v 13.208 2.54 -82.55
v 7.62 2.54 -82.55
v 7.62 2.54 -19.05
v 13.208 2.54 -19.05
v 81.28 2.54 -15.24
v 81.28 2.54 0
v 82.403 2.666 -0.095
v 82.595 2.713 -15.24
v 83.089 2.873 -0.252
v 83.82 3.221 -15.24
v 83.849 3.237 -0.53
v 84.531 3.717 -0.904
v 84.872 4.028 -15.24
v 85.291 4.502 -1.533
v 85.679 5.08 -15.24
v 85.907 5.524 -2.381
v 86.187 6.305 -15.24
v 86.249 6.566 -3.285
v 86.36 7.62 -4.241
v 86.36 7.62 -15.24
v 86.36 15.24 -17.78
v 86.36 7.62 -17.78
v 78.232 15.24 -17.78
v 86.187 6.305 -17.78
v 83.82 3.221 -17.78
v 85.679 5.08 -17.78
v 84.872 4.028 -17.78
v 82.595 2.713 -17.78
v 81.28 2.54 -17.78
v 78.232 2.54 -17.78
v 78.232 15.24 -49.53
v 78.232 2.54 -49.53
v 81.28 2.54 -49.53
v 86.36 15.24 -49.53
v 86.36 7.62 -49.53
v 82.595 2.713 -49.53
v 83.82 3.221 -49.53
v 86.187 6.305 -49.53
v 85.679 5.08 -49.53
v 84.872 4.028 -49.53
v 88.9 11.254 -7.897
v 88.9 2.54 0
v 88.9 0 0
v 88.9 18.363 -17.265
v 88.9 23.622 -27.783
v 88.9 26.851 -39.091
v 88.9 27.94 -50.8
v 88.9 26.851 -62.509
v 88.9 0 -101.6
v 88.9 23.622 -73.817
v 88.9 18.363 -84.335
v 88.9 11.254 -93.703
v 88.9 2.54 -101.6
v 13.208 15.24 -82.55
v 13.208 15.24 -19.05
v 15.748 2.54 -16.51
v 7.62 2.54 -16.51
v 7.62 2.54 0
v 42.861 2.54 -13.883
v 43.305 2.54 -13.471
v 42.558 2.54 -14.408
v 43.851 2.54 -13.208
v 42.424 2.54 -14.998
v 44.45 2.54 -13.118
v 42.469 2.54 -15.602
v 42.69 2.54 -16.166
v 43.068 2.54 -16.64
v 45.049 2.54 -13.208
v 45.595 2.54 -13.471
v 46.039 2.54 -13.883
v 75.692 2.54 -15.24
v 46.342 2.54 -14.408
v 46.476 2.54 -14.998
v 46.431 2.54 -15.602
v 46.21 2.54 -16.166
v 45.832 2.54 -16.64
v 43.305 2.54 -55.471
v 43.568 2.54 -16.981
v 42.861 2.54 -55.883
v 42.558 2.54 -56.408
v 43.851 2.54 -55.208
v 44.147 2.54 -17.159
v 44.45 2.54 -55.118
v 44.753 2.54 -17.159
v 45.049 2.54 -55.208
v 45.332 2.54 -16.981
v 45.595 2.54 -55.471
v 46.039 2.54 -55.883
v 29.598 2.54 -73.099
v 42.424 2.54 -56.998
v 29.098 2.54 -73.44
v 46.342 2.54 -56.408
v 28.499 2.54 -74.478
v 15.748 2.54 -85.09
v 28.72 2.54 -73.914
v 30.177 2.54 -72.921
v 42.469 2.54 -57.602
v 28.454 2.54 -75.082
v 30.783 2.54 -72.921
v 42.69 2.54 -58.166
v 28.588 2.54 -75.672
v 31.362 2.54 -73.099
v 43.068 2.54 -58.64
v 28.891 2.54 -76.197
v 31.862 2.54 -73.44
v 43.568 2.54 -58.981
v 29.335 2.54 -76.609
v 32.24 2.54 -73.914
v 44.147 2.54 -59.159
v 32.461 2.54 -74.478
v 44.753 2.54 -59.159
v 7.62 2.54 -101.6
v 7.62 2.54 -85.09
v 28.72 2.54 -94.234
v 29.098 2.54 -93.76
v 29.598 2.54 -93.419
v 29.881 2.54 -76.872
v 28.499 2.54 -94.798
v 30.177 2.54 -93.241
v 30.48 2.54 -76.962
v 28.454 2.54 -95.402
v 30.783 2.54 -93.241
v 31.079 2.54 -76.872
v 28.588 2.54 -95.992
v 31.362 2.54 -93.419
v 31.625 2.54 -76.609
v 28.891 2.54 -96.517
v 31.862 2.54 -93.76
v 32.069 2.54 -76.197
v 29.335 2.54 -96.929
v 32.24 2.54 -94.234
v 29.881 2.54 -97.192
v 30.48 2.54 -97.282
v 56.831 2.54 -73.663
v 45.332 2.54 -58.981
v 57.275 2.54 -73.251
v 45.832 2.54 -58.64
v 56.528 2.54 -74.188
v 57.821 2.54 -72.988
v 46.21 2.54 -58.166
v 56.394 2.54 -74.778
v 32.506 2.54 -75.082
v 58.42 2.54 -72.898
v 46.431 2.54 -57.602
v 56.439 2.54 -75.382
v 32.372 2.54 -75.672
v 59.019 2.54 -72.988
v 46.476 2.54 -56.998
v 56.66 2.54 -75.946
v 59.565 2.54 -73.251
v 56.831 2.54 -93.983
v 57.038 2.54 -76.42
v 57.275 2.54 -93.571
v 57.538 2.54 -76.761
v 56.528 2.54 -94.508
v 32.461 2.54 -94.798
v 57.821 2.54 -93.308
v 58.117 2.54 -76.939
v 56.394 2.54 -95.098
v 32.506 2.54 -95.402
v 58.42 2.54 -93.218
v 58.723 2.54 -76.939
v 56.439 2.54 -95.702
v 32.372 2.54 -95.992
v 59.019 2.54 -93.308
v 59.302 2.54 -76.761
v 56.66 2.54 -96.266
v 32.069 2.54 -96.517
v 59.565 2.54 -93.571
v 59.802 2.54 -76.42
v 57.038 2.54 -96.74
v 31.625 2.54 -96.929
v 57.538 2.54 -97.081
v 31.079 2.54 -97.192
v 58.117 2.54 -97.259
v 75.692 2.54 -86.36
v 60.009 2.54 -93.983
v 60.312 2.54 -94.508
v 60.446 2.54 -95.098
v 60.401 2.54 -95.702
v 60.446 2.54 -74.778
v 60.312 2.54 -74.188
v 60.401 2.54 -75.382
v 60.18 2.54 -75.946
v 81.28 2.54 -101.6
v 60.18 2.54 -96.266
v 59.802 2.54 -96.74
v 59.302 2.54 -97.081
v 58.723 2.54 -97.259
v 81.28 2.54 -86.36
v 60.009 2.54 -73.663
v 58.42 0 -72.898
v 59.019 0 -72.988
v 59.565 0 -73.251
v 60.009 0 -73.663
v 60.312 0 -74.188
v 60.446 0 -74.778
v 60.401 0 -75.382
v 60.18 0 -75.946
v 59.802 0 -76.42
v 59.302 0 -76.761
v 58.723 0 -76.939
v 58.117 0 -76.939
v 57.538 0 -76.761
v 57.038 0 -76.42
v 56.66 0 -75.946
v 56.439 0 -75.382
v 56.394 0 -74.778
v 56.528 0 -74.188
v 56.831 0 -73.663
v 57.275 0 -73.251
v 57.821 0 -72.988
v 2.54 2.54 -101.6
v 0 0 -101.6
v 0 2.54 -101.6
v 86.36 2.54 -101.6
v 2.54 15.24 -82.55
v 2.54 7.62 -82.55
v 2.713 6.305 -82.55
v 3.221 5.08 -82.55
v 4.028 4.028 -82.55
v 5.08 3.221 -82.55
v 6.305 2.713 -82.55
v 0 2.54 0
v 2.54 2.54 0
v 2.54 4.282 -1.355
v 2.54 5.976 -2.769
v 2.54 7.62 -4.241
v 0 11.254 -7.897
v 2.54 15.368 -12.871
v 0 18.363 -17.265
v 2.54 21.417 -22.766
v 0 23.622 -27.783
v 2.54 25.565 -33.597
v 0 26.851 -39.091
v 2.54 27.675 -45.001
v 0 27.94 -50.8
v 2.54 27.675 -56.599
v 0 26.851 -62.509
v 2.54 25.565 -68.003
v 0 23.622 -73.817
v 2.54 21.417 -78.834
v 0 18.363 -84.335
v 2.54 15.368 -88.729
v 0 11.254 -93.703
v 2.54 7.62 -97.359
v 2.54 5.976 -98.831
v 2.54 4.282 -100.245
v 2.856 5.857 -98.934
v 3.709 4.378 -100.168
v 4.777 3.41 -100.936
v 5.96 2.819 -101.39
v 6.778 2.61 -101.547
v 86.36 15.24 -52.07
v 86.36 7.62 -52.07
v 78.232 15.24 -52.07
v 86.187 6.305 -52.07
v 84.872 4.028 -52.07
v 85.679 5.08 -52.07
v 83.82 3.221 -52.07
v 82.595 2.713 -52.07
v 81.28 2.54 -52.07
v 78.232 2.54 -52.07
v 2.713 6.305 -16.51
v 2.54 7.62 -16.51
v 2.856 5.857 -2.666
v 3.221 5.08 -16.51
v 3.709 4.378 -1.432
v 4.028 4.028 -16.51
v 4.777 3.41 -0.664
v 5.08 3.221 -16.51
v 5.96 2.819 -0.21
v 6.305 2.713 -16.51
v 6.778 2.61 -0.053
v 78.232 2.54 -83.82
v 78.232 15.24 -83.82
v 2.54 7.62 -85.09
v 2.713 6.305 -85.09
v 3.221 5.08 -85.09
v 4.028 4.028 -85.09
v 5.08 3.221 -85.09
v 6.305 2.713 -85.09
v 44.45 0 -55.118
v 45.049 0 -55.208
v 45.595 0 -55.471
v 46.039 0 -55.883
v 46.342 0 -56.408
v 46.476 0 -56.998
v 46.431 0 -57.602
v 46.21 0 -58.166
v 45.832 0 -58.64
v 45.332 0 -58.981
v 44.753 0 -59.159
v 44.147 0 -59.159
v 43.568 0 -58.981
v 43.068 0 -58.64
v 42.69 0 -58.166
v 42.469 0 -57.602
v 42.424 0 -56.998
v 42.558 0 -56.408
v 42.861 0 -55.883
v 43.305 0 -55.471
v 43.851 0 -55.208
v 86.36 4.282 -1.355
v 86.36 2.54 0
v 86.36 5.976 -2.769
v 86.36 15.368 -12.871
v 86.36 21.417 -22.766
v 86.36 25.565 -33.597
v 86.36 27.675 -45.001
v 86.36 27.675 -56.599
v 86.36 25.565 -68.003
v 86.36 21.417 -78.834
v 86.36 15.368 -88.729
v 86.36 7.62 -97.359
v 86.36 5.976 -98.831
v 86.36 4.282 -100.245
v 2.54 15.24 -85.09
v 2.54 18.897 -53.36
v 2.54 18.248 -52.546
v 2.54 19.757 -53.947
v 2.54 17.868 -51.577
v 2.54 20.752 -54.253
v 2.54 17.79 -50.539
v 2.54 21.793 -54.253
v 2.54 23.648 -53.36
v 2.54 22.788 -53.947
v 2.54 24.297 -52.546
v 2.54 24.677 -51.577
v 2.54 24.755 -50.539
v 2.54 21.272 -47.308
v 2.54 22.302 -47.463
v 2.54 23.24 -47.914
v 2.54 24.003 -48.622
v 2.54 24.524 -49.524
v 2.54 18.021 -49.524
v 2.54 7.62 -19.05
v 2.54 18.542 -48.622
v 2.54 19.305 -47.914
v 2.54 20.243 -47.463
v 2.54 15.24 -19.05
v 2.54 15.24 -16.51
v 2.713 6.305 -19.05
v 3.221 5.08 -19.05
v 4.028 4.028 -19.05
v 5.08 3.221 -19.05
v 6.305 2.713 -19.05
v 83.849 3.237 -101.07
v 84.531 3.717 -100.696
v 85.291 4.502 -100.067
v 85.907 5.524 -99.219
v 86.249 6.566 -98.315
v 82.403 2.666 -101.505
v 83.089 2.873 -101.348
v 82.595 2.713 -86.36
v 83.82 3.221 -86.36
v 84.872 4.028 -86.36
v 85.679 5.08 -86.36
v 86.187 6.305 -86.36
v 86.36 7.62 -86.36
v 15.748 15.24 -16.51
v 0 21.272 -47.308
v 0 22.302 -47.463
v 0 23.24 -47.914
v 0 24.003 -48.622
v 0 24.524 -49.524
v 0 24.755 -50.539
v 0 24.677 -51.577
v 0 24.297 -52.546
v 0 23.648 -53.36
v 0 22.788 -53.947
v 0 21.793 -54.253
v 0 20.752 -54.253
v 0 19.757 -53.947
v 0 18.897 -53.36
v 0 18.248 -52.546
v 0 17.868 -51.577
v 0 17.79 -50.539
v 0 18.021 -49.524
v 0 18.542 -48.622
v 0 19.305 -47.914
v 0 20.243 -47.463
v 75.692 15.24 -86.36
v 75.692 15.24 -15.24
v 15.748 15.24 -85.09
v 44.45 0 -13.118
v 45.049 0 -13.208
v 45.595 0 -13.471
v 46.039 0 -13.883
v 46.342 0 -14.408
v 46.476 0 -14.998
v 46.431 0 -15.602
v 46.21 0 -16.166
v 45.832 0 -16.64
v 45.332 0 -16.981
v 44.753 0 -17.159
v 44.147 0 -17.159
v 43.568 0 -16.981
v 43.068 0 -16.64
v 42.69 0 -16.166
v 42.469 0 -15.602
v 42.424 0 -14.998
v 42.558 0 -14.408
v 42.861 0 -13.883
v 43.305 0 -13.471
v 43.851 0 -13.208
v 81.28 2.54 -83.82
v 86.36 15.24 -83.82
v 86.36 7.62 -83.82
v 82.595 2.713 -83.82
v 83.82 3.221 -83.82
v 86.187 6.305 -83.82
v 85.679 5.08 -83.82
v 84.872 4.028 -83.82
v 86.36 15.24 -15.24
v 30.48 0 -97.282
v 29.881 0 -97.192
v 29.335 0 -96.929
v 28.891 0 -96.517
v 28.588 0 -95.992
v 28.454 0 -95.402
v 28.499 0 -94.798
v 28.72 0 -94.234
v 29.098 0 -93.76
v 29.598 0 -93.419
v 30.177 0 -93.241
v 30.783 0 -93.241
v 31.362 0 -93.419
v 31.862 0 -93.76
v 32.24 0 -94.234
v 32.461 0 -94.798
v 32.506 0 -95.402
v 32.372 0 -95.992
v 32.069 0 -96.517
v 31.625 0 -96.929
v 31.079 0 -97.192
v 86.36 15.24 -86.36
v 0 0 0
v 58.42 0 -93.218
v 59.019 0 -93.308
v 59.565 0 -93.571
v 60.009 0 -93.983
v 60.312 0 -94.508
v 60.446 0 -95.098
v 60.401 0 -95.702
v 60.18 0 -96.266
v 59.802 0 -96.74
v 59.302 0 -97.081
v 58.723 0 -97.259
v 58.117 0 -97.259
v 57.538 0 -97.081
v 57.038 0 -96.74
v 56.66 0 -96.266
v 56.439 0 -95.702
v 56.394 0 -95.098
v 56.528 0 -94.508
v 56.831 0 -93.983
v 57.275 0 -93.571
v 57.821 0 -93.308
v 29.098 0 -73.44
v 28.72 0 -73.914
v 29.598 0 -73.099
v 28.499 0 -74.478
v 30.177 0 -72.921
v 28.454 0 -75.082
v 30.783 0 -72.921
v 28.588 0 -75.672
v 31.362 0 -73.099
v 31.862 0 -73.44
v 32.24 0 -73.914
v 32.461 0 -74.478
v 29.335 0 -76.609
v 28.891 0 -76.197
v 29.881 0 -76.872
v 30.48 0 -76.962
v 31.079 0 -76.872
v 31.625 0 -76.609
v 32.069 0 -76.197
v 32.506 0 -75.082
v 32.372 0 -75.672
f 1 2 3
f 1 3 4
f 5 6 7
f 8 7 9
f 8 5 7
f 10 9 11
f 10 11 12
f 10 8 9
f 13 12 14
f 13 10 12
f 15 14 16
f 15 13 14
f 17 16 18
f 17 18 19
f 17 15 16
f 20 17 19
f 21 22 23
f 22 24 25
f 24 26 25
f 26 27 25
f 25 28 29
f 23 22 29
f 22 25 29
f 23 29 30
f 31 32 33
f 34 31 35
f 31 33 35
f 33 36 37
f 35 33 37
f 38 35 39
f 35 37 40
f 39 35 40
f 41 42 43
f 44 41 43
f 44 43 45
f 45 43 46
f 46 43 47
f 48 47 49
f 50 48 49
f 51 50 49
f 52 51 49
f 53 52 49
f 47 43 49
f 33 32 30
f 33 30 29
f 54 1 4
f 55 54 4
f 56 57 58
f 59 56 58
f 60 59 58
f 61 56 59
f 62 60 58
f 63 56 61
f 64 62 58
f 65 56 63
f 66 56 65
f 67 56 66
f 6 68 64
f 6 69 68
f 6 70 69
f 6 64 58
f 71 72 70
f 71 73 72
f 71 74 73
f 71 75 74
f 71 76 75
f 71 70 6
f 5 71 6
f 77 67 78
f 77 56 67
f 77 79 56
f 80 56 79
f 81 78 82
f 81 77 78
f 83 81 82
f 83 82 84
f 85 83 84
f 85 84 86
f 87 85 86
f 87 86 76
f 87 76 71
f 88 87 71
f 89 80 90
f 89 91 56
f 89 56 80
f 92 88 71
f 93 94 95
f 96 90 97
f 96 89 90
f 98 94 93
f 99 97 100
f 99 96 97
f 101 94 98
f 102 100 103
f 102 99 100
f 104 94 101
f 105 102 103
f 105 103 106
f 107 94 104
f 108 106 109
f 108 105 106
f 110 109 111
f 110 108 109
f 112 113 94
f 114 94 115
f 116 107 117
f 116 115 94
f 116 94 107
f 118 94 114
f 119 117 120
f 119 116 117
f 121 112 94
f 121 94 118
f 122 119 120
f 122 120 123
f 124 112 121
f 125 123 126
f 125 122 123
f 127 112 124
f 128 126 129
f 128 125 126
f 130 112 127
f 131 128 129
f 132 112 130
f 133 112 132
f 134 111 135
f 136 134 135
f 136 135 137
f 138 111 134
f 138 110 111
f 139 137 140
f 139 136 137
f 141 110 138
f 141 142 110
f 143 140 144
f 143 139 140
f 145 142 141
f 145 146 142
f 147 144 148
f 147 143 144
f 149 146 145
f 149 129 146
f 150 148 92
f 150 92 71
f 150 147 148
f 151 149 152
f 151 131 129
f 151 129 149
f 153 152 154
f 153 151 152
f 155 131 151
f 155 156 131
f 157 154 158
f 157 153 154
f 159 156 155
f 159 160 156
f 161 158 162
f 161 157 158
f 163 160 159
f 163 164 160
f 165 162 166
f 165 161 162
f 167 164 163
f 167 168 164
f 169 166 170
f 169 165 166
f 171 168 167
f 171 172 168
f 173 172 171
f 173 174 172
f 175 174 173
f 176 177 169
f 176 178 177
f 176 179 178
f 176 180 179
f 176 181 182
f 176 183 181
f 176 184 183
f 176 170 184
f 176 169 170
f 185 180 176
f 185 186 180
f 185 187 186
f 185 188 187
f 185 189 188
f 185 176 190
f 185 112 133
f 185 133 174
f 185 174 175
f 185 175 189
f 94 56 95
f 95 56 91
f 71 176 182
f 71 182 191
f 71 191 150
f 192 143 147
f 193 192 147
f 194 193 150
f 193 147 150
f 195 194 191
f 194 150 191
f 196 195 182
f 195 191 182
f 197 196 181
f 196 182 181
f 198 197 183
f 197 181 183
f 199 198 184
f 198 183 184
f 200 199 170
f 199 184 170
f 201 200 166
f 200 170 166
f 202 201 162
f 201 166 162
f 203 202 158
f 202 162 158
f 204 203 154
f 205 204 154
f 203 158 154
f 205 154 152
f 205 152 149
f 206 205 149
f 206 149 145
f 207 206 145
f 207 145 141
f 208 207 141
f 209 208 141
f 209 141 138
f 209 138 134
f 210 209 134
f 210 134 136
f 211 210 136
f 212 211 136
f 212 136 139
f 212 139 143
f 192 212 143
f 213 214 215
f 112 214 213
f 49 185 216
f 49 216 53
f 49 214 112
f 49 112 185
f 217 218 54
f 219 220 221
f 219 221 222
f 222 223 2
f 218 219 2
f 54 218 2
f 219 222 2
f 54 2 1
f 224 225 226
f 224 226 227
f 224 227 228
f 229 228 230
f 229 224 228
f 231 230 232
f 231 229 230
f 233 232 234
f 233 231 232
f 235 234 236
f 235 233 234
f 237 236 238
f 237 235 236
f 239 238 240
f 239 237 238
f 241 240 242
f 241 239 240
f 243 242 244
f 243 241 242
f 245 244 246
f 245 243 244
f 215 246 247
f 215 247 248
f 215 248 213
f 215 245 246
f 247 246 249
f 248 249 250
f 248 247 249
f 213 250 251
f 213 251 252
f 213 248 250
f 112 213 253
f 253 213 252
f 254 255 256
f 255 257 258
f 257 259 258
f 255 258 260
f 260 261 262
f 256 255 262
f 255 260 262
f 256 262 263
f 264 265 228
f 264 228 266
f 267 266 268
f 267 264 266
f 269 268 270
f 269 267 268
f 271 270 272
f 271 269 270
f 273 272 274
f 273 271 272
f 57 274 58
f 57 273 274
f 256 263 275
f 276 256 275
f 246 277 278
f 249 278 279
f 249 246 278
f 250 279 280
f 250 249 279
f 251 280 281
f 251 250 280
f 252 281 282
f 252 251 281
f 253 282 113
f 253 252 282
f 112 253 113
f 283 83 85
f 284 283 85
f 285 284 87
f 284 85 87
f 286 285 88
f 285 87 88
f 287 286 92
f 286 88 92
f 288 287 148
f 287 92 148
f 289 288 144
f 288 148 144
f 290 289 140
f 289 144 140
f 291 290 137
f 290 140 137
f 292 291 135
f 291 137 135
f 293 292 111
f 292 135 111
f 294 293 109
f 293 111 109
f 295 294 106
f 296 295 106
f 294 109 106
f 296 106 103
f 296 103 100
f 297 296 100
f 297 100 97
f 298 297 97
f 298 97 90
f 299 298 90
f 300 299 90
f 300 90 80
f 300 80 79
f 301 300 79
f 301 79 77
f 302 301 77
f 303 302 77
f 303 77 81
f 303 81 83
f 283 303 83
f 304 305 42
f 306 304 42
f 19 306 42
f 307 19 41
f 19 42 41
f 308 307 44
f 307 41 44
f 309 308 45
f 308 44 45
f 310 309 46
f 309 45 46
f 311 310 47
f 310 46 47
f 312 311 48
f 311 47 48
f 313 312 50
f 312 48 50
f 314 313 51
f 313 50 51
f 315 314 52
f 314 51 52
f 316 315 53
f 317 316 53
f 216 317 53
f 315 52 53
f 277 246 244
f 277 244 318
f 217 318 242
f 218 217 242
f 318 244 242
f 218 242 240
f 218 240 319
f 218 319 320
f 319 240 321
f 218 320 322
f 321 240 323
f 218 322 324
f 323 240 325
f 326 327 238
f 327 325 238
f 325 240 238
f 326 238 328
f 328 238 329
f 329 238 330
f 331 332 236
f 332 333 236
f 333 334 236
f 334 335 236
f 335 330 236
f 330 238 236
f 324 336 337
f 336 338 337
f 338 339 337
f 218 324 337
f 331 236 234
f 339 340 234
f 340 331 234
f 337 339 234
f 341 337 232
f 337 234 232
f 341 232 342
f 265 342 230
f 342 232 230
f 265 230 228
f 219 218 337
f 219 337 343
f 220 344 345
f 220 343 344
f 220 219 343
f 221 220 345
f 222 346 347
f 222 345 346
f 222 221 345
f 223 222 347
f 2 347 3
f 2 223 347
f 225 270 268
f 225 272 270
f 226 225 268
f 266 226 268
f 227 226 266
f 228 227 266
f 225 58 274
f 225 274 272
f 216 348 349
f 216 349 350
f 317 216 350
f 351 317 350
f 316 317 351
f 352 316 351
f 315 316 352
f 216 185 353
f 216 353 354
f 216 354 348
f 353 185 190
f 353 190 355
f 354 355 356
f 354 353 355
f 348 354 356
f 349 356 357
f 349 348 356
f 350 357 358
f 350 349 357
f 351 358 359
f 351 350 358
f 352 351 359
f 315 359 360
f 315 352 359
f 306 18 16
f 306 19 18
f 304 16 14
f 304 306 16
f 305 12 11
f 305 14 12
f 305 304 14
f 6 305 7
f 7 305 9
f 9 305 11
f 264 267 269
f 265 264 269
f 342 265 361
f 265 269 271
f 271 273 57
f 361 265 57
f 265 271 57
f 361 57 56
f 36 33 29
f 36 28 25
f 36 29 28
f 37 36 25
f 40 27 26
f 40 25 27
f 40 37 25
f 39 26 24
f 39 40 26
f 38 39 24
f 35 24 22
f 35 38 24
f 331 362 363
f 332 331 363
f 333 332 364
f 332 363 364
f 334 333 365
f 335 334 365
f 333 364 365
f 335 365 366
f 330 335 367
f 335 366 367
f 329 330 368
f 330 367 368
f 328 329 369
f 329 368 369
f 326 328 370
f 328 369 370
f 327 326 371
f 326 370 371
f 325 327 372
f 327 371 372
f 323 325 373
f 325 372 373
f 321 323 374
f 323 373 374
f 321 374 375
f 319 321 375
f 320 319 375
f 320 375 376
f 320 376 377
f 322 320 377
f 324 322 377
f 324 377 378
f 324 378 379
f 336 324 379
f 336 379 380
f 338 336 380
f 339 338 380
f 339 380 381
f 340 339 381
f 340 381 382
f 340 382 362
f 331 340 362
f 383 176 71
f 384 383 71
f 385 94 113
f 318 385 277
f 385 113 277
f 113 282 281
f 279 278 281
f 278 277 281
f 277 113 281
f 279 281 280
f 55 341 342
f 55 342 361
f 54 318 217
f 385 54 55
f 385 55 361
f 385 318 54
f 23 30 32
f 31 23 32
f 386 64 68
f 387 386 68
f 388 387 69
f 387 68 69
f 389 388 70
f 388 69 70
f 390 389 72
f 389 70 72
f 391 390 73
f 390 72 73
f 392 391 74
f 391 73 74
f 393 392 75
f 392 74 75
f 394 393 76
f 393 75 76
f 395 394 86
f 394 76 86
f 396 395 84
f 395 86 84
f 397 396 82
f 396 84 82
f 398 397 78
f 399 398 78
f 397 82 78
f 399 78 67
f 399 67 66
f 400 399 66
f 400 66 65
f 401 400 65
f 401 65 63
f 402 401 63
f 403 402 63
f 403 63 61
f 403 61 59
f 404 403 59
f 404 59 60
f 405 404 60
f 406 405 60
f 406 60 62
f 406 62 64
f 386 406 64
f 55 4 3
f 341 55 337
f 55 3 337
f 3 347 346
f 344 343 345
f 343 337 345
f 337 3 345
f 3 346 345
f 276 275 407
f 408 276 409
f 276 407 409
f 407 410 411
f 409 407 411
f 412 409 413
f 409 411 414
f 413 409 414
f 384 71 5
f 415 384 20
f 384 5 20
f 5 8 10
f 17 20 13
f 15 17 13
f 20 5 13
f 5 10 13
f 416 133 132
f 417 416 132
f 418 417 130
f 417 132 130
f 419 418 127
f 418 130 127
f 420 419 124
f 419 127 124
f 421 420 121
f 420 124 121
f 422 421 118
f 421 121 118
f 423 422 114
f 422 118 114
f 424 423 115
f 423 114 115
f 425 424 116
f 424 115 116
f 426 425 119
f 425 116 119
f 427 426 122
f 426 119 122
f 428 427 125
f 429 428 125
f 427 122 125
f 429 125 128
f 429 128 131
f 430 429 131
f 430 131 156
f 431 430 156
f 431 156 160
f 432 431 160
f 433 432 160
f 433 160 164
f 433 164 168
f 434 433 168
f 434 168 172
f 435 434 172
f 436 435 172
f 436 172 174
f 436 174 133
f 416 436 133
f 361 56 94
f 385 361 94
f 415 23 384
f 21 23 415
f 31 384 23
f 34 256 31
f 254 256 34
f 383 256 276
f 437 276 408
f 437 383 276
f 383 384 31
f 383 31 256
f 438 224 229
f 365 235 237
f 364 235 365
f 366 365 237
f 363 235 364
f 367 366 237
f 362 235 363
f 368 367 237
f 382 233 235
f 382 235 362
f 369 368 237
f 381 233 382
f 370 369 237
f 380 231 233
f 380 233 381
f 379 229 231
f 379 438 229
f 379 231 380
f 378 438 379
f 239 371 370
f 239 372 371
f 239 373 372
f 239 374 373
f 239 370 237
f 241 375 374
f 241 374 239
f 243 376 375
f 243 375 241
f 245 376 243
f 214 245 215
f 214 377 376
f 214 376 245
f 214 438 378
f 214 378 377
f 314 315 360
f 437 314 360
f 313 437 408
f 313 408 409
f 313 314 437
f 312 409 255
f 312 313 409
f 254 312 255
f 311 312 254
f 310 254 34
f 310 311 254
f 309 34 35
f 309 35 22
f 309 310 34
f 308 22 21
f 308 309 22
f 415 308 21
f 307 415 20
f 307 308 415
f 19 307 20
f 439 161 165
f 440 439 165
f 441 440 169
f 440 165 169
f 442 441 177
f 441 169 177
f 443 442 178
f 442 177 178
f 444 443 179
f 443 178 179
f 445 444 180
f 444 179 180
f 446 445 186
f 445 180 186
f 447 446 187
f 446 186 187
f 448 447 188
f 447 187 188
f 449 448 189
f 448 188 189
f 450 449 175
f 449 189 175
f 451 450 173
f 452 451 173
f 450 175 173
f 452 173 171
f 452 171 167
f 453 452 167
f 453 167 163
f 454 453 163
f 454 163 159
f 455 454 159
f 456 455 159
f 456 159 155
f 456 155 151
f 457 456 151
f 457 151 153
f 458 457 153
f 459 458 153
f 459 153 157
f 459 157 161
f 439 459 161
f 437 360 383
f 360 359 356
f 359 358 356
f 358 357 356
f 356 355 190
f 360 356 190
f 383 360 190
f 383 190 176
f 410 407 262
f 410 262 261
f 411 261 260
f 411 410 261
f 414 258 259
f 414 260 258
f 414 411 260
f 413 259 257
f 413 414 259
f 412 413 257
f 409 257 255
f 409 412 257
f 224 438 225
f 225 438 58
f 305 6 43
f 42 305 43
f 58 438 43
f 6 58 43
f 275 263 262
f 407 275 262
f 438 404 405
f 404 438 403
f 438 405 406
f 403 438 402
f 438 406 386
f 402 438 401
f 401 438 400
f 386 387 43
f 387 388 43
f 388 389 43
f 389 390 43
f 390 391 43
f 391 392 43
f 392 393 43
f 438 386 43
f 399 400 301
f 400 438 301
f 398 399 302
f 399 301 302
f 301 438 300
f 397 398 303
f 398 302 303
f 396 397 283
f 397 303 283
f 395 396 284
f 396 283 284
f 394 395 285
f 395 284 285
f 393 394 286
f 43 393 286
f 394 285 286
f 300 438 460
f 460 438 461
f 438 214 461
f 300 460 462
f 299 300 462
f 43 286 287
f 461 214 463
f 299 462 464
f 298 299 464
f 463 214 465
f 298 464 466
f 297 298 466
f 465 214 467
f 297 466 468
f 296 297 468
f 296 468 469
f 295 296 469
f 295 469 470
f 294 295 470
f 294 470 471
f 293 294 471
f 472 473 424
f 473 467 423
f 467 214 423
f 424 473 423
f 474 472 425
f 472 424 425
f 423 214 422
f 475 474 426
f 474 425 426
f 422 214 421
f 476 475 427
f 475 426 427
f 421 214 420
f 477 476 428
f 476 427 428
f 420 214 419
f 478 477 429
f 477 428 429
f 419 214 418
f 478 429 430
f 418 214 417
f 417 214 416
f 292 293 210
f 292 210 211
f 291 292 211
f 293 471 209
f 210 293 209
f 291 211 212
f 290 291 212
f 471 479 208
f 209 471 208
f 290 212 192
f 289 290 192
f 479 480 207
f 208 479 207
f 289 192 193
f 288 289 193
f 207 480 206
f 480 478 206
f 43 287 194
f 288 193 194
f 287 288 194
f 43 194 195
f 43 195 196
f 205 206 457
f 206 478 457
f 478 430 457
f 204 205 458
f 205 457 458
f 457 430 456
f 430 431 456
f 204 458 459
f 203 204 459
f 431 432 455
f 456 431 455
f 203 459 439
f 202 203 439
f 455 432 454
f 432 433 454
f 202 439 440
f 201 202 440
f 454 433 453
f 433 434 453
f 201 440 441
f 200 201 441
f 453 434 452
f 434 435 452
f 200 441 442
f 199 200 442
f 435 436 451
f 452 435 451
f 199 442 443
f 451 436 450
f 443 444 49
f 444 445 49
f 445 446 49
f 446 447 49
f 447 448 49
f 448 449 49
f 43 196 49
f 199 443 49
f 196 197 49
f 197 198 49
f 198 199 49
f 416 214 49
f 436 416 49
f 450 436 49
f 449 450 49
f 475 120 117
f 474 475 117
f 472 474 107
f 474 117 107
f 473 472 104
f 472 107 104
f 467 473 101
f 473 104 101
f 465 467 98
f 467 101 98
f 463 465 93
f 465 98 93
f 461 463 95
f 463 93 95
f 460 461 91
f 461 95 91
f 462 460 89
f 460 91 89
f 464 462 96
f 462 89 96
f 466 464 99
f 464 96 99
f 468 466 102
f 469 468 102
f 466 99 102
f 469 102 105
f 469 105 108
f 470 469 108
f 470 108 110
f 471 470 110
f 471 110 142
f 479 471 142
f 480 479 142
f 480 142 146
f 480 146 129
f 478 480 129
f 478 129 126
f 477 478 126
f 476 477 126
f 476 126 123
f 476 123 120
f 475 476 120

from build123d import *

# Parameters (mm, degrees)
SKETCH1_W           = 88.9
SKETCH1_H           = 101.6
BASE_EXTRUDE_DEPTH  = 2.54
WALL_EXTRUDE_DEPTH  = 2.54
CUT_EXTRUDE1_REACH  = 139.864
SKETCH3_R           = 3.4925
FILLET2_R           = 5.08
SKETCH4_R           = 2.032
CUT_EXTRUDE2_DEPTH  = 138.371503752
SKETCH5_W           = 2.54
SKETCH5_H           = 2.54
SKETCH5_W_2         = 5.08
SKETCH5_W_3         = 3.048
BOSS_EXTRUDE1_DEPTH = 12.7


with BuildPart() as part:
    # Sketch1 → Base Extrude (new body)
    with BuildSketch(Plane(origin=(0, 0, 0), x_dir=(1, 0, 0), z_dir=(0, 1, 0))):
        with Locations((44.45, 50.8)):
            Rectangle(SKETCH1_W, SKETCH1_H)
    extrude(amount=BASE_EXTRUDE_DEPTH)

    # Sketch2 → Wall Extrude (add)
    with BuildSketch(Plane(origin=(88.9, 0, 0), x_dir=(0, 0, -1), z_dir=(1, 0, 0))):
        with BuildLine():
            Line((101.6, 2.54), (101.6, 0))
            Line((101.6, 0), (0, 0))
            Line((0, 0), (0, 2.54))
            ThreePointArc((0, 2.54), (50.8, 27.94), (101.6, 2.54))
        make_face()
    wall_extrude = extrude(amount=-WALL_EXTRUDE_DEPTH)

    # Wall Mirror: Wall Extrude across plane
    add(wall_extrude.mirror(Plane(origin=(44.45, 0, 0), x_dir=(0, 0, 1), z_dir=(1, 0, 0))))

    # Sketch3 → Cut-Extrude1 (cut, up to next)
    with BuildSketch(Plane.ZY, mode=Mode.PRIVATE) as cut_extrude1_sk1:
        with Locations((-50.8, 21.2725)):
            Circle(SKETCH3_R)
    cut_extrude1_tool1 = extrude(cut_extrude1_sk1.sketch, amount=-CUT_EXTRUDE1_REACH, mode=Mode.PRIVATE) & part.part
    add(cut_extrude1_tool1.solids().sort_by_distance((0, 21.2725, -50.8))[0], mode=Mode.SUBTRACT)

    # Fillet2
    # the kernel refuses this fillet: 5.08 mm, written as the material it adds along each edge
    with BuildSketch(Plane(origin=(86.36, 2.54, -101.6), x_dir=(-1, 0, 0), z_dir=(0, 0, 1))) as fillet2_piece_1_section:
        with BuildLine():
            CenterArc((FILLET2_R, -FILLET2_R), FILLET2_R, 90, 90)
            Line((0, -FILLET2_R), (0, 0))
            Line((0, 0), (FILLET2_R, 0))
        make_face()
    fillet2_piece_1 = extrude(amount=101.6, mode=Mode.PRIVATE)
    fillet2_piece_1 = fillet2_piece_1 & Plane(origin=(85.198656014, -35.56, -50.8), x_dir=(0, 0.6000000000000003, 0.7999999999999998), z_dir=(1, 0, 0)) * Cylinder(63.5, 224, mode=Mode.PRIVATE)
    add(fillet2_piece_1)
    with BuildSketch(Plane(origin=(2.54, 2.54, -101.6), x_dir=(1, 0, 0), z_dir=(0, 0, 1))) as fillet2_piece_2_section:
        with BuildLine():
            CenterArc((FILLET2_R, FILLET2_R), FILLET2_R, 180, 90)
            Line((0, FILLET2_R), (0, 0))
            Line((0, 0), (FILLET2_R, 0))
        make_face()
    fillet2_piece_2 = extrude(amount=101.6, mode=Mode.PRIVATE)
    fillet2_piece_2 = fillet2_piece_2 & Plane(origin=(3.701343986, -35.56, -50.8), x_dir=(0, 0.6000000000000003, 0.7999999999999998), z_dir=(-1, 0, 0)) * Cylinder(63.5, 224, mode=Mode.PRIVATE)
    add(fillet2_piece_2)

    # Sketch4 → Cut-Extrude2 (cut, through all)
    with BuildSketch(Plane(origin=(0, 2.54, 0), x_dir=(1, 0, 0), z_dir=(0, 1, 0))):
        with Locations(Location((44.45, 57.15, 0), (0, 0, 270))):
            Circle(SKETCH4_R)
        with Locations(Location((44.45, 15.15, 0), (0, 0, 270))):
            Circle(SKETCH4_R)
        with Locations(Location((58.42, 74.93, 0), (0, 0, 270))):
            Circle(SKETCH4_R)
        with Locations(Location((58.42, 95.25, 0), (0, 0, 270))):
            Circle(SKETCH4_R)
        with Locations(Location((30.48, 74.93, 0), (0, 0, 90))):
            Circle(SKETCH4_R)
        with Locations(Location((30.48, 95.25, 0), (0, 0, 90))):
            Circle(SKETCH4_R)
    extrude(amount=-CUT_EXTRUDE2_DEPTH, mode=Mode.SUBTRACT)

    # Sketch5 → Boss-Extrude1 (add)
    with BuildSketch(Plane(origin=(0, 2.54, 0), x_dir=(1, 0, 0), z_dir=(0, 1, 0))):
        with Locations((87.63, 50.8)):
            Rectangle(SKETCH5_W, SKETCH5_H)
        Polygon((13.208, 82.55), (13.208, 19.05), (7.62, 19.05), (7.62, 16.51), (15.748, 16.51), (15.748, 85.09), (7.62, 85.09), (7.62, 82.55), align=None)
        with Locations((5.08, 17.78)):
            Rectangle(SKETCH5_W_2, SKETCH5_H)
        with Locations((5.08, 83.82)):
            Rectangle(SKETCH5_W_2, SKETCH5_H)
        Polygon((81.28, 83.82), (81.28, 86.36), (75.692, 86.36), (75.692, 52.07), (78.232, 52.07), (78.232, 83.82), align=None)
        Polygon((78.232, 49.53), (75.692, 49.53), (75.692, 15.24), (81.28, 15.24), (81.28, 17.78), (78.232, 17.78), align=None)
        with Locations((83.82, 50.8)):
            Rectangle(SKETCH5_W_2, SKETCH5_H)
        with Locations((79.756, 50.8)):
            Rectangle(SKETCH5_W_3, SKETCH5_H)
        with Locations((76.962, 50.8)):
            Rectangle(SKETCH5_W, SKETCH5_H)
        with Locations((83.82, 85.09)):
            Rectangle(SKETCH5_W_2, SKETCH5_H)
        with Locations((83.82, 16.51)):
            Rectangle(SKETCH5_W_2, SKETCH5_H)
    extrude(amount=BOSS_EXTRUDE1_DEPTH)


solid = part.part
